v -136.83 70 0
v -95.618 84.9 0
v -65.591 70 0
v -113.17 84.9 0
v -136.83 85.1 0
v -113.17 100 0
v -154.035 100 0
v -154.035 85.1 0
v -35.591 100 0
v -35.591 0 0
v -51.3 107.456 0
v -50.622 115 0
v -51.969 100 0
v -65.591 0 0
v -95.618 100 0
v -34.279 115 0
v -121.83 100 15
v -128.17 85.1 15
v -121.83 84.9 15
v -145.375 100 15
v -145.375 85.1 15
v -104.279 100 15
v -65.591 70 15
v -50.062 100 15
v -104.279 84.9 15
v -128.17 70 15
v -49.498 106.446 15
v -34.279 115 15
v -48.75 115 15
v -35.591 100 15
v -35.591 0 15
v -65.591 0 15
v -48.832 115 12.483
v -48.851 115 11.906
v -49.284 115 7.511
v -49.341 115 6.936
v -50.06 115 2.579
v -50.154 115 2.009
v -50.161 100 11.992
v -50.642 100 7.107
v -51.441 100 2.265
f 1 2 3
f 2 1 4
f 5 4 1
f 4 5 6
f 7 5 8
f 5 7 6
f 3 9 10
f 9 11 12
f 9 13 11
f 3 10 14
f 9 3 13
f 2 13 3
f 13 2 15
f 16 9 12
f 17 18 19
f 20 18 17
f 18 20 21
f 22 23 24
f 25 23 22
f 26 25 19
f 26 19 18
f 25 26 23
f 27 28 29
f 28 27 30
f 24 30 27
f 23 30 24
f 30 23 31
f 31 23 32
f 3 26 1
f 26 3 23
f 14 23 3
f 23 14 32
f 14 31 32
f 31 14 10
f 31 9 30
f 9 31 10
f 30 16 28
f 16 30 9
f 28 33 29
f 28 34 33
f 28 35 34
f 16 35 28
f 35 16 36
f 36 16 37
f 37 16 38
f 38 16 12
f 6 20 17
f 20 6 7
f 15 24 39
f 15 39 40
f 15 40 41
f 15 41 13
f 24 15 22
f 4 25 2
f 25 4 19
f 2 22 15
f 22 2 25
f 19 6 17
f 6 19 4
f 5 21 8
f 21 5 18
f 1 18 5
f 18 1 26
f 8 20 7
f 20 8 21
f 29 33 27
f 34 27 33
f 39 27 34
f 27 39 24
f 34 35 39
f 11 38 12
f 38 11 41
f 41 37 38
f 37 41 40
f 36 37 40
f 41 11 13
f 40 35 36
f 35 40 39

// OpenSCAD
// Single-piece reciprocal pot stand (trivet) with minimized hub.
// Purpose: One printable leg geometry that arrays into a 3 to 5 leg stand.
// The vertical foot width expands inwards toward the center. Includes a
// boolean toggle to switch the pot support wall between a curved contour 
// for round pots, or a flat plane for rectangular/polygonal pots.
// Builtin OpenSCAD only, no library needed.

// ================= PARAMETERS =================
/* [Assembly] */
// Number of identical legs in the stand
num_legs = 3; // [3:1:5]

/* [Clearance and Fit] */
// Slide-fit gap applied to the mating slots (width and depth) and the inner tip joint
slot_clearance = 0.2; // [0:0.05:1]
// Minimum solid material required between the two intersecting slots
min_solid_bridge = 15; // [5:1:30]

/* [Bracket members] */
// Width of the horizontal bar and the vertical leg
member_width = 30; // [10:1:100]
// Extrusion thickness of the part (flat print thickness)
member_thickness = 15; // [5:1:50]

/* [Pot size] */
// Pot diameter the stand is sized for, up to a 25 cm pot
pot_diameter = 150; // [100:5:250]
// Height of the stand from the table to the resting bars
foot_length = 100; // [50:5:200]

/* [Pot support] */
// True carves a curved profile for round pots. False keeps the face flat for polygonal pots.
contour_support_face = true; 
// Height of each support wall above the stand top
support_height = 15; // [0:1:100]
// Lean of each support wall away from the stand center
support_angle = 5; // [0:1:45]
// Width of the support wall base (independent of member_width)
support_width = 15; // [5:0.5:100]

/* [Layout] */
// Empty space between the solid part and the ghost assembly
part_gap = 100; // [0:5:200]

/* [Preview] */
// Draw the assembled ghost cross in fast previews; renders and STL stay solid
show_ghosts = true;

/* [Hidden] */
alpha = 360 / num_legs;
t_clear = member_thickness + slot_clearance;

// Calculate the minimum possible hub offset that maintains the min_solid_bridge
hub_offset_auto = (t_clear / sin(alpha) + min_solid_bridge) / (2 * tan(alpha / 2));
// Ensure the offset never causes the central hole radius to go negative
hub_offset = max(t_clear / 2, hub_offset_auto);

actual_radius = max(pot_diameter / 2, hub_offset + 1);
ghost_pot_extra = 20;

// ================= MAIN MODULES =================

// 2D profile of the solid uncut leg. 
module uncut_leg_2d() {
    x_start = -pot_diameter; // Extended far inside, cleanly chopped by tip_cutter
    
    // Intersection of the offset leg centerline with the target pot radius
    x_pot_circle = sqrt(pow(actual_radius, 2) - pow(hub_offset, 2));
    
    // If contoured, extend inward to guarantee boolean intersection. If flat, sit at apothem.
    x_inner = contour_support_face ? x_pot_circle - member_thickness : actual_radius;
    x_outer = contour_support_face ? x_pot_circle + support_width : actual_radius + support_width;
    
    union() {
        // Main horizontal bar
        translate([x_start, foot_length - member_width])
            square([x_outer - x_start, member_width]);
            
        // Foot extending downwards (aligned to outer edge, expanding inward)
        translate([x_outer - member_width, 0])
            square([member_width, foot_length]);
            
        // Support wall leaning outward
        lean = support_height * tan(support_angle);
        polygon([
            [x_inner, foot_length],
            [x_outer, foot_length],
            [x_outer + lean, foot_length + support_height],
            [x_inner + lean, foot_length + support_height]
        ]);
    }
}

// Extrudes the profile and orients it upright, centered perfectly on the Y axis.
module uncut_leg_upright() {
    translate([0, member_thickness / 2, 0])
        rotate([90, 0, 0])
            linear_extrude(member_thickness)
                uncut_leg_2d();
}

// Mathematical cutter block representing the intersecting slots.
module slot_cutter(is_top) {
    cut_w = 1000; 
    cut_thick = t_clear;
    // Overcut depth by slot_clearance / 2 to prevent bottoming out
    cut_h = member_width / 2 + slot_clearance / 2 + 1; 
    
    z_start = is_top ? (foot_length - member_width / 2 - slot_clearance / 2) 
                     : (foot_length - member_width - 1);
    
    translate([-cut_w / 2, hub_offset - cut_thick / 2, z_start])
        cube([cut_w, cut_thick, cut_h]);
}

// Chops the inner tip of the leg at the exact angle to sit flush against the adjacent leg.
module tip_cutter() {
    rotate([0, 0, alpha])
        translate([-500, hub_offset + member_thickness / 2 - slot_clearance, -500])
            cube([1000, 1000, 1000]);
}

// Carves the inner face of the support wall to perfectly contour a curved pot.
module pot_cutter() {
    slope = tan(support_angle);
    pot_height = support_height + 2;
    r_bottom = actual_radius;
    r_top = r_bottom + pot_height * slope;
    
    translate([0, 0, foot_length])
        cylinder(h = pot_height, r1 = r_bottom, r2 = r_top, $fn = 96);
}

// The leg positioned in the global assembly with mathematically subtracted joints and contours.
module slotted_leg_global() {
    difference() {
        // Base leg placed at operational radius
        translate([0, hub_offset, 0])
            uncut_leg_upright();
            
        // Outer Slot (Top Cut): Subtracted by the preceding leg (Leg -1)
        rotate([0, 0, -alpha])
            slot_cutter(true);
            
        // Inner Slot (Bottom Cut): Subtracted by the succeeding leg (Leg +1)
        rotate([0, 0, alpha])
            slot_cutter(false);
            
        // Inner Tip Chop: Trims excess material with clearance applied
        tip_cutter();
        
        // Support Contour: Carves the support wall if enabled for round pots
        if (contour_support_face) {
            pot_cutter();
        }
    }
}

// Reverses the assembly transformations to lay the final angled-cut leg flat for 3D printing.
module single_leg_flat() {
    translate([0, 0, member_thickness / 2])
        rotate([-90, 0, 0])
            translate([0, -hub_offset, 0])
                slotted_leg_global();
}

// Ghost view of the pot resting in the support walls.
module ghost_pot() {
    slope = tan(support_angle);
    pot_height = support_height + ghost_pot_extra;
    r_bottom = actual_radius;
    r_top = r_bottom + pot_height * slope;
    wall = 3;
    
    // Adapt geometry to circular or polygonal shape based on settings
    pot_fn = contour_support_face ? 96 : num_legs;
    r_mult = contour_support_face ? 1 : 1 / cos(180 / pot_fn);
    rot_z = contour_support_face ? 0 : 180 / pot_fn;
    
    rotate([0, 0, rot_z])
    %difference() {
        cylinder(h = pot_height, r1 = r_bottom * r_mult, r2 = r_top * r_mult, $fn = pot_fn);
        translate([0, 0, -1])
            cylinder(h = pot_height + 2,
                     r1 = (r_bottom - wall) * r_mult - slope,
                     r2 = (r_bottom - wall) * r_mult + (pot_height + 1) * slope,
                     $fn = pot_fn);
    }
}

// Assembles the upright legs radially to form the minimized reciprocal frame.
module assembly_ghost() {
    for (i = [0 : num_legs - 1]) {
        rotate([0, 0, i * alpha])
            %slotted_leg_global();
    }
    translate([0, 0, foot_length])
        ghost_pot();
}

// Combined layout mapping for visualization and export.
module pot_stand() {
    // Left: The single solid part to be printed flat on the XY plane
    translate([-pot_diameter / 2 - part_gap / 2, 0, 0])
        single_leg_flat();

    // Right: The ghost assembly showing the flush interlocking hub
    if ($preview && show_ghosts) {
        translate([pot_diameter / 2 + part_gap / 2, 0, 0])
            assembly_ghost();
    }
}

// ================= INSTANTIATION =================
pot_stand();
